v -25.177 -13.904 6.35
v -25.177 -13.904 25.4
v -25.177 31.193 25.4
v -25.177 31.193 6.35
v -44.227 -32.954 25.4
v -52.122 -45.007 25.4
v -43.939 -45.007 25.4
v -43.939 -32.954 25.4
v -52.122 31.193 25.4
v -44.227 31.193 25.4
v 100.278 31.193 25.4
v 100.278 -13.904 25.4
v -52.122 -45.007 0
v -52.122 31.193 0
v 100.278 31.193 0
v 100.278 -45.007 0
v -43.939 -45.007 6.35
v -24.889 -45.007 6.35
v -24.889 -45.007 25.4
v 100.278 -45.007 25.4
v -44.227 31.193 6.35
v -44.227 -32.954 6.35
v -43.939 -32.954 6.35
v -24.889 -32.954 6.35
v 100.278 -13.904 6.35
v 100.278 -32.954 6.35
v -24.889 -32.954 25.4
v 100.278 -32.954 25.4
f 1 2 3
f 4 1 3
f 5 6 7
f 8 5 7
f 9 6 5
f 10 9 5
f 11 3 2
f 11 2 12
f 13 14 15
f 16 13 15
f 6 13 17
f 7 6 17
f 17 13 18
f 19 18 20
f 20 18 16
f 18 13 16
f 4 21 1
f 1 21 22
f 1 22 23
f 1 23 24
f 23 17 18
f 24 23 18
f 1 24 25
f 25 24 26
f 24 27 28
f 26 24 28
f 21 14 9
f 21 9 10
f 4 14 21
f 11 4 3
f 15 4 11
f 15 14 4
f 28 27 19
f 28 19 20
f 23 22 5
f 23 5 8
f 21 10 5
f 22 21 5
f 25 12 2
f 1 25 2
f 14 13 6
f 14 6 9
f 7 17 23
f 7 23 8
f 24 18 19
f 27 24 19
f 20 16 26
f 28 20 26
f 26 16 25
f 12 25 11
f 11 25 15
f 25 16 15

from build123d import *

# Parameters (mm, degrees)
F0_W     = 152.4
F0_H     = 76.2
F1_DEPTH = 25.4
F3_DEPTH = 19.05
F4_W     = 19.05
F4_H     = 19.05
F5_DEPTH = 12.192


with BuildPart() as f1:
    # F0 (on Top) → F1 (new body)
    with BuildSketch(Plane.XY):
        with Locations((24.078096, -6.907338)):
            Rectangle(F0_W, F0_H)
    extrude(amount=F1_DEPTH)

    # F2 (on face) → F3 (cut)
    with BuildSketch(Plane.XY.offset(25.4)):
        Polygon((-25.176978, 31.192662), (-44.226978, 31.192662), (-44.226978, -32.953762), (100.278096, -32.953762), (100.278096, -13.903762), (-25.176978, -13.903762), align=None)
    extrude(amount=-F3_DEPTH, mode=Mode.SUBTRACT)

    # F4 (on face) → F5 (cut)
    with BuildSketch(Plane.XZ.offset(45.007338)):
        with Locations((-34.414173, 15.875)):
            Rectangle(F4_W, F4_H)
    extrude(amount=-F5_DEPTH, mode=Mode.SUBTRACT)


solid = f1.part
